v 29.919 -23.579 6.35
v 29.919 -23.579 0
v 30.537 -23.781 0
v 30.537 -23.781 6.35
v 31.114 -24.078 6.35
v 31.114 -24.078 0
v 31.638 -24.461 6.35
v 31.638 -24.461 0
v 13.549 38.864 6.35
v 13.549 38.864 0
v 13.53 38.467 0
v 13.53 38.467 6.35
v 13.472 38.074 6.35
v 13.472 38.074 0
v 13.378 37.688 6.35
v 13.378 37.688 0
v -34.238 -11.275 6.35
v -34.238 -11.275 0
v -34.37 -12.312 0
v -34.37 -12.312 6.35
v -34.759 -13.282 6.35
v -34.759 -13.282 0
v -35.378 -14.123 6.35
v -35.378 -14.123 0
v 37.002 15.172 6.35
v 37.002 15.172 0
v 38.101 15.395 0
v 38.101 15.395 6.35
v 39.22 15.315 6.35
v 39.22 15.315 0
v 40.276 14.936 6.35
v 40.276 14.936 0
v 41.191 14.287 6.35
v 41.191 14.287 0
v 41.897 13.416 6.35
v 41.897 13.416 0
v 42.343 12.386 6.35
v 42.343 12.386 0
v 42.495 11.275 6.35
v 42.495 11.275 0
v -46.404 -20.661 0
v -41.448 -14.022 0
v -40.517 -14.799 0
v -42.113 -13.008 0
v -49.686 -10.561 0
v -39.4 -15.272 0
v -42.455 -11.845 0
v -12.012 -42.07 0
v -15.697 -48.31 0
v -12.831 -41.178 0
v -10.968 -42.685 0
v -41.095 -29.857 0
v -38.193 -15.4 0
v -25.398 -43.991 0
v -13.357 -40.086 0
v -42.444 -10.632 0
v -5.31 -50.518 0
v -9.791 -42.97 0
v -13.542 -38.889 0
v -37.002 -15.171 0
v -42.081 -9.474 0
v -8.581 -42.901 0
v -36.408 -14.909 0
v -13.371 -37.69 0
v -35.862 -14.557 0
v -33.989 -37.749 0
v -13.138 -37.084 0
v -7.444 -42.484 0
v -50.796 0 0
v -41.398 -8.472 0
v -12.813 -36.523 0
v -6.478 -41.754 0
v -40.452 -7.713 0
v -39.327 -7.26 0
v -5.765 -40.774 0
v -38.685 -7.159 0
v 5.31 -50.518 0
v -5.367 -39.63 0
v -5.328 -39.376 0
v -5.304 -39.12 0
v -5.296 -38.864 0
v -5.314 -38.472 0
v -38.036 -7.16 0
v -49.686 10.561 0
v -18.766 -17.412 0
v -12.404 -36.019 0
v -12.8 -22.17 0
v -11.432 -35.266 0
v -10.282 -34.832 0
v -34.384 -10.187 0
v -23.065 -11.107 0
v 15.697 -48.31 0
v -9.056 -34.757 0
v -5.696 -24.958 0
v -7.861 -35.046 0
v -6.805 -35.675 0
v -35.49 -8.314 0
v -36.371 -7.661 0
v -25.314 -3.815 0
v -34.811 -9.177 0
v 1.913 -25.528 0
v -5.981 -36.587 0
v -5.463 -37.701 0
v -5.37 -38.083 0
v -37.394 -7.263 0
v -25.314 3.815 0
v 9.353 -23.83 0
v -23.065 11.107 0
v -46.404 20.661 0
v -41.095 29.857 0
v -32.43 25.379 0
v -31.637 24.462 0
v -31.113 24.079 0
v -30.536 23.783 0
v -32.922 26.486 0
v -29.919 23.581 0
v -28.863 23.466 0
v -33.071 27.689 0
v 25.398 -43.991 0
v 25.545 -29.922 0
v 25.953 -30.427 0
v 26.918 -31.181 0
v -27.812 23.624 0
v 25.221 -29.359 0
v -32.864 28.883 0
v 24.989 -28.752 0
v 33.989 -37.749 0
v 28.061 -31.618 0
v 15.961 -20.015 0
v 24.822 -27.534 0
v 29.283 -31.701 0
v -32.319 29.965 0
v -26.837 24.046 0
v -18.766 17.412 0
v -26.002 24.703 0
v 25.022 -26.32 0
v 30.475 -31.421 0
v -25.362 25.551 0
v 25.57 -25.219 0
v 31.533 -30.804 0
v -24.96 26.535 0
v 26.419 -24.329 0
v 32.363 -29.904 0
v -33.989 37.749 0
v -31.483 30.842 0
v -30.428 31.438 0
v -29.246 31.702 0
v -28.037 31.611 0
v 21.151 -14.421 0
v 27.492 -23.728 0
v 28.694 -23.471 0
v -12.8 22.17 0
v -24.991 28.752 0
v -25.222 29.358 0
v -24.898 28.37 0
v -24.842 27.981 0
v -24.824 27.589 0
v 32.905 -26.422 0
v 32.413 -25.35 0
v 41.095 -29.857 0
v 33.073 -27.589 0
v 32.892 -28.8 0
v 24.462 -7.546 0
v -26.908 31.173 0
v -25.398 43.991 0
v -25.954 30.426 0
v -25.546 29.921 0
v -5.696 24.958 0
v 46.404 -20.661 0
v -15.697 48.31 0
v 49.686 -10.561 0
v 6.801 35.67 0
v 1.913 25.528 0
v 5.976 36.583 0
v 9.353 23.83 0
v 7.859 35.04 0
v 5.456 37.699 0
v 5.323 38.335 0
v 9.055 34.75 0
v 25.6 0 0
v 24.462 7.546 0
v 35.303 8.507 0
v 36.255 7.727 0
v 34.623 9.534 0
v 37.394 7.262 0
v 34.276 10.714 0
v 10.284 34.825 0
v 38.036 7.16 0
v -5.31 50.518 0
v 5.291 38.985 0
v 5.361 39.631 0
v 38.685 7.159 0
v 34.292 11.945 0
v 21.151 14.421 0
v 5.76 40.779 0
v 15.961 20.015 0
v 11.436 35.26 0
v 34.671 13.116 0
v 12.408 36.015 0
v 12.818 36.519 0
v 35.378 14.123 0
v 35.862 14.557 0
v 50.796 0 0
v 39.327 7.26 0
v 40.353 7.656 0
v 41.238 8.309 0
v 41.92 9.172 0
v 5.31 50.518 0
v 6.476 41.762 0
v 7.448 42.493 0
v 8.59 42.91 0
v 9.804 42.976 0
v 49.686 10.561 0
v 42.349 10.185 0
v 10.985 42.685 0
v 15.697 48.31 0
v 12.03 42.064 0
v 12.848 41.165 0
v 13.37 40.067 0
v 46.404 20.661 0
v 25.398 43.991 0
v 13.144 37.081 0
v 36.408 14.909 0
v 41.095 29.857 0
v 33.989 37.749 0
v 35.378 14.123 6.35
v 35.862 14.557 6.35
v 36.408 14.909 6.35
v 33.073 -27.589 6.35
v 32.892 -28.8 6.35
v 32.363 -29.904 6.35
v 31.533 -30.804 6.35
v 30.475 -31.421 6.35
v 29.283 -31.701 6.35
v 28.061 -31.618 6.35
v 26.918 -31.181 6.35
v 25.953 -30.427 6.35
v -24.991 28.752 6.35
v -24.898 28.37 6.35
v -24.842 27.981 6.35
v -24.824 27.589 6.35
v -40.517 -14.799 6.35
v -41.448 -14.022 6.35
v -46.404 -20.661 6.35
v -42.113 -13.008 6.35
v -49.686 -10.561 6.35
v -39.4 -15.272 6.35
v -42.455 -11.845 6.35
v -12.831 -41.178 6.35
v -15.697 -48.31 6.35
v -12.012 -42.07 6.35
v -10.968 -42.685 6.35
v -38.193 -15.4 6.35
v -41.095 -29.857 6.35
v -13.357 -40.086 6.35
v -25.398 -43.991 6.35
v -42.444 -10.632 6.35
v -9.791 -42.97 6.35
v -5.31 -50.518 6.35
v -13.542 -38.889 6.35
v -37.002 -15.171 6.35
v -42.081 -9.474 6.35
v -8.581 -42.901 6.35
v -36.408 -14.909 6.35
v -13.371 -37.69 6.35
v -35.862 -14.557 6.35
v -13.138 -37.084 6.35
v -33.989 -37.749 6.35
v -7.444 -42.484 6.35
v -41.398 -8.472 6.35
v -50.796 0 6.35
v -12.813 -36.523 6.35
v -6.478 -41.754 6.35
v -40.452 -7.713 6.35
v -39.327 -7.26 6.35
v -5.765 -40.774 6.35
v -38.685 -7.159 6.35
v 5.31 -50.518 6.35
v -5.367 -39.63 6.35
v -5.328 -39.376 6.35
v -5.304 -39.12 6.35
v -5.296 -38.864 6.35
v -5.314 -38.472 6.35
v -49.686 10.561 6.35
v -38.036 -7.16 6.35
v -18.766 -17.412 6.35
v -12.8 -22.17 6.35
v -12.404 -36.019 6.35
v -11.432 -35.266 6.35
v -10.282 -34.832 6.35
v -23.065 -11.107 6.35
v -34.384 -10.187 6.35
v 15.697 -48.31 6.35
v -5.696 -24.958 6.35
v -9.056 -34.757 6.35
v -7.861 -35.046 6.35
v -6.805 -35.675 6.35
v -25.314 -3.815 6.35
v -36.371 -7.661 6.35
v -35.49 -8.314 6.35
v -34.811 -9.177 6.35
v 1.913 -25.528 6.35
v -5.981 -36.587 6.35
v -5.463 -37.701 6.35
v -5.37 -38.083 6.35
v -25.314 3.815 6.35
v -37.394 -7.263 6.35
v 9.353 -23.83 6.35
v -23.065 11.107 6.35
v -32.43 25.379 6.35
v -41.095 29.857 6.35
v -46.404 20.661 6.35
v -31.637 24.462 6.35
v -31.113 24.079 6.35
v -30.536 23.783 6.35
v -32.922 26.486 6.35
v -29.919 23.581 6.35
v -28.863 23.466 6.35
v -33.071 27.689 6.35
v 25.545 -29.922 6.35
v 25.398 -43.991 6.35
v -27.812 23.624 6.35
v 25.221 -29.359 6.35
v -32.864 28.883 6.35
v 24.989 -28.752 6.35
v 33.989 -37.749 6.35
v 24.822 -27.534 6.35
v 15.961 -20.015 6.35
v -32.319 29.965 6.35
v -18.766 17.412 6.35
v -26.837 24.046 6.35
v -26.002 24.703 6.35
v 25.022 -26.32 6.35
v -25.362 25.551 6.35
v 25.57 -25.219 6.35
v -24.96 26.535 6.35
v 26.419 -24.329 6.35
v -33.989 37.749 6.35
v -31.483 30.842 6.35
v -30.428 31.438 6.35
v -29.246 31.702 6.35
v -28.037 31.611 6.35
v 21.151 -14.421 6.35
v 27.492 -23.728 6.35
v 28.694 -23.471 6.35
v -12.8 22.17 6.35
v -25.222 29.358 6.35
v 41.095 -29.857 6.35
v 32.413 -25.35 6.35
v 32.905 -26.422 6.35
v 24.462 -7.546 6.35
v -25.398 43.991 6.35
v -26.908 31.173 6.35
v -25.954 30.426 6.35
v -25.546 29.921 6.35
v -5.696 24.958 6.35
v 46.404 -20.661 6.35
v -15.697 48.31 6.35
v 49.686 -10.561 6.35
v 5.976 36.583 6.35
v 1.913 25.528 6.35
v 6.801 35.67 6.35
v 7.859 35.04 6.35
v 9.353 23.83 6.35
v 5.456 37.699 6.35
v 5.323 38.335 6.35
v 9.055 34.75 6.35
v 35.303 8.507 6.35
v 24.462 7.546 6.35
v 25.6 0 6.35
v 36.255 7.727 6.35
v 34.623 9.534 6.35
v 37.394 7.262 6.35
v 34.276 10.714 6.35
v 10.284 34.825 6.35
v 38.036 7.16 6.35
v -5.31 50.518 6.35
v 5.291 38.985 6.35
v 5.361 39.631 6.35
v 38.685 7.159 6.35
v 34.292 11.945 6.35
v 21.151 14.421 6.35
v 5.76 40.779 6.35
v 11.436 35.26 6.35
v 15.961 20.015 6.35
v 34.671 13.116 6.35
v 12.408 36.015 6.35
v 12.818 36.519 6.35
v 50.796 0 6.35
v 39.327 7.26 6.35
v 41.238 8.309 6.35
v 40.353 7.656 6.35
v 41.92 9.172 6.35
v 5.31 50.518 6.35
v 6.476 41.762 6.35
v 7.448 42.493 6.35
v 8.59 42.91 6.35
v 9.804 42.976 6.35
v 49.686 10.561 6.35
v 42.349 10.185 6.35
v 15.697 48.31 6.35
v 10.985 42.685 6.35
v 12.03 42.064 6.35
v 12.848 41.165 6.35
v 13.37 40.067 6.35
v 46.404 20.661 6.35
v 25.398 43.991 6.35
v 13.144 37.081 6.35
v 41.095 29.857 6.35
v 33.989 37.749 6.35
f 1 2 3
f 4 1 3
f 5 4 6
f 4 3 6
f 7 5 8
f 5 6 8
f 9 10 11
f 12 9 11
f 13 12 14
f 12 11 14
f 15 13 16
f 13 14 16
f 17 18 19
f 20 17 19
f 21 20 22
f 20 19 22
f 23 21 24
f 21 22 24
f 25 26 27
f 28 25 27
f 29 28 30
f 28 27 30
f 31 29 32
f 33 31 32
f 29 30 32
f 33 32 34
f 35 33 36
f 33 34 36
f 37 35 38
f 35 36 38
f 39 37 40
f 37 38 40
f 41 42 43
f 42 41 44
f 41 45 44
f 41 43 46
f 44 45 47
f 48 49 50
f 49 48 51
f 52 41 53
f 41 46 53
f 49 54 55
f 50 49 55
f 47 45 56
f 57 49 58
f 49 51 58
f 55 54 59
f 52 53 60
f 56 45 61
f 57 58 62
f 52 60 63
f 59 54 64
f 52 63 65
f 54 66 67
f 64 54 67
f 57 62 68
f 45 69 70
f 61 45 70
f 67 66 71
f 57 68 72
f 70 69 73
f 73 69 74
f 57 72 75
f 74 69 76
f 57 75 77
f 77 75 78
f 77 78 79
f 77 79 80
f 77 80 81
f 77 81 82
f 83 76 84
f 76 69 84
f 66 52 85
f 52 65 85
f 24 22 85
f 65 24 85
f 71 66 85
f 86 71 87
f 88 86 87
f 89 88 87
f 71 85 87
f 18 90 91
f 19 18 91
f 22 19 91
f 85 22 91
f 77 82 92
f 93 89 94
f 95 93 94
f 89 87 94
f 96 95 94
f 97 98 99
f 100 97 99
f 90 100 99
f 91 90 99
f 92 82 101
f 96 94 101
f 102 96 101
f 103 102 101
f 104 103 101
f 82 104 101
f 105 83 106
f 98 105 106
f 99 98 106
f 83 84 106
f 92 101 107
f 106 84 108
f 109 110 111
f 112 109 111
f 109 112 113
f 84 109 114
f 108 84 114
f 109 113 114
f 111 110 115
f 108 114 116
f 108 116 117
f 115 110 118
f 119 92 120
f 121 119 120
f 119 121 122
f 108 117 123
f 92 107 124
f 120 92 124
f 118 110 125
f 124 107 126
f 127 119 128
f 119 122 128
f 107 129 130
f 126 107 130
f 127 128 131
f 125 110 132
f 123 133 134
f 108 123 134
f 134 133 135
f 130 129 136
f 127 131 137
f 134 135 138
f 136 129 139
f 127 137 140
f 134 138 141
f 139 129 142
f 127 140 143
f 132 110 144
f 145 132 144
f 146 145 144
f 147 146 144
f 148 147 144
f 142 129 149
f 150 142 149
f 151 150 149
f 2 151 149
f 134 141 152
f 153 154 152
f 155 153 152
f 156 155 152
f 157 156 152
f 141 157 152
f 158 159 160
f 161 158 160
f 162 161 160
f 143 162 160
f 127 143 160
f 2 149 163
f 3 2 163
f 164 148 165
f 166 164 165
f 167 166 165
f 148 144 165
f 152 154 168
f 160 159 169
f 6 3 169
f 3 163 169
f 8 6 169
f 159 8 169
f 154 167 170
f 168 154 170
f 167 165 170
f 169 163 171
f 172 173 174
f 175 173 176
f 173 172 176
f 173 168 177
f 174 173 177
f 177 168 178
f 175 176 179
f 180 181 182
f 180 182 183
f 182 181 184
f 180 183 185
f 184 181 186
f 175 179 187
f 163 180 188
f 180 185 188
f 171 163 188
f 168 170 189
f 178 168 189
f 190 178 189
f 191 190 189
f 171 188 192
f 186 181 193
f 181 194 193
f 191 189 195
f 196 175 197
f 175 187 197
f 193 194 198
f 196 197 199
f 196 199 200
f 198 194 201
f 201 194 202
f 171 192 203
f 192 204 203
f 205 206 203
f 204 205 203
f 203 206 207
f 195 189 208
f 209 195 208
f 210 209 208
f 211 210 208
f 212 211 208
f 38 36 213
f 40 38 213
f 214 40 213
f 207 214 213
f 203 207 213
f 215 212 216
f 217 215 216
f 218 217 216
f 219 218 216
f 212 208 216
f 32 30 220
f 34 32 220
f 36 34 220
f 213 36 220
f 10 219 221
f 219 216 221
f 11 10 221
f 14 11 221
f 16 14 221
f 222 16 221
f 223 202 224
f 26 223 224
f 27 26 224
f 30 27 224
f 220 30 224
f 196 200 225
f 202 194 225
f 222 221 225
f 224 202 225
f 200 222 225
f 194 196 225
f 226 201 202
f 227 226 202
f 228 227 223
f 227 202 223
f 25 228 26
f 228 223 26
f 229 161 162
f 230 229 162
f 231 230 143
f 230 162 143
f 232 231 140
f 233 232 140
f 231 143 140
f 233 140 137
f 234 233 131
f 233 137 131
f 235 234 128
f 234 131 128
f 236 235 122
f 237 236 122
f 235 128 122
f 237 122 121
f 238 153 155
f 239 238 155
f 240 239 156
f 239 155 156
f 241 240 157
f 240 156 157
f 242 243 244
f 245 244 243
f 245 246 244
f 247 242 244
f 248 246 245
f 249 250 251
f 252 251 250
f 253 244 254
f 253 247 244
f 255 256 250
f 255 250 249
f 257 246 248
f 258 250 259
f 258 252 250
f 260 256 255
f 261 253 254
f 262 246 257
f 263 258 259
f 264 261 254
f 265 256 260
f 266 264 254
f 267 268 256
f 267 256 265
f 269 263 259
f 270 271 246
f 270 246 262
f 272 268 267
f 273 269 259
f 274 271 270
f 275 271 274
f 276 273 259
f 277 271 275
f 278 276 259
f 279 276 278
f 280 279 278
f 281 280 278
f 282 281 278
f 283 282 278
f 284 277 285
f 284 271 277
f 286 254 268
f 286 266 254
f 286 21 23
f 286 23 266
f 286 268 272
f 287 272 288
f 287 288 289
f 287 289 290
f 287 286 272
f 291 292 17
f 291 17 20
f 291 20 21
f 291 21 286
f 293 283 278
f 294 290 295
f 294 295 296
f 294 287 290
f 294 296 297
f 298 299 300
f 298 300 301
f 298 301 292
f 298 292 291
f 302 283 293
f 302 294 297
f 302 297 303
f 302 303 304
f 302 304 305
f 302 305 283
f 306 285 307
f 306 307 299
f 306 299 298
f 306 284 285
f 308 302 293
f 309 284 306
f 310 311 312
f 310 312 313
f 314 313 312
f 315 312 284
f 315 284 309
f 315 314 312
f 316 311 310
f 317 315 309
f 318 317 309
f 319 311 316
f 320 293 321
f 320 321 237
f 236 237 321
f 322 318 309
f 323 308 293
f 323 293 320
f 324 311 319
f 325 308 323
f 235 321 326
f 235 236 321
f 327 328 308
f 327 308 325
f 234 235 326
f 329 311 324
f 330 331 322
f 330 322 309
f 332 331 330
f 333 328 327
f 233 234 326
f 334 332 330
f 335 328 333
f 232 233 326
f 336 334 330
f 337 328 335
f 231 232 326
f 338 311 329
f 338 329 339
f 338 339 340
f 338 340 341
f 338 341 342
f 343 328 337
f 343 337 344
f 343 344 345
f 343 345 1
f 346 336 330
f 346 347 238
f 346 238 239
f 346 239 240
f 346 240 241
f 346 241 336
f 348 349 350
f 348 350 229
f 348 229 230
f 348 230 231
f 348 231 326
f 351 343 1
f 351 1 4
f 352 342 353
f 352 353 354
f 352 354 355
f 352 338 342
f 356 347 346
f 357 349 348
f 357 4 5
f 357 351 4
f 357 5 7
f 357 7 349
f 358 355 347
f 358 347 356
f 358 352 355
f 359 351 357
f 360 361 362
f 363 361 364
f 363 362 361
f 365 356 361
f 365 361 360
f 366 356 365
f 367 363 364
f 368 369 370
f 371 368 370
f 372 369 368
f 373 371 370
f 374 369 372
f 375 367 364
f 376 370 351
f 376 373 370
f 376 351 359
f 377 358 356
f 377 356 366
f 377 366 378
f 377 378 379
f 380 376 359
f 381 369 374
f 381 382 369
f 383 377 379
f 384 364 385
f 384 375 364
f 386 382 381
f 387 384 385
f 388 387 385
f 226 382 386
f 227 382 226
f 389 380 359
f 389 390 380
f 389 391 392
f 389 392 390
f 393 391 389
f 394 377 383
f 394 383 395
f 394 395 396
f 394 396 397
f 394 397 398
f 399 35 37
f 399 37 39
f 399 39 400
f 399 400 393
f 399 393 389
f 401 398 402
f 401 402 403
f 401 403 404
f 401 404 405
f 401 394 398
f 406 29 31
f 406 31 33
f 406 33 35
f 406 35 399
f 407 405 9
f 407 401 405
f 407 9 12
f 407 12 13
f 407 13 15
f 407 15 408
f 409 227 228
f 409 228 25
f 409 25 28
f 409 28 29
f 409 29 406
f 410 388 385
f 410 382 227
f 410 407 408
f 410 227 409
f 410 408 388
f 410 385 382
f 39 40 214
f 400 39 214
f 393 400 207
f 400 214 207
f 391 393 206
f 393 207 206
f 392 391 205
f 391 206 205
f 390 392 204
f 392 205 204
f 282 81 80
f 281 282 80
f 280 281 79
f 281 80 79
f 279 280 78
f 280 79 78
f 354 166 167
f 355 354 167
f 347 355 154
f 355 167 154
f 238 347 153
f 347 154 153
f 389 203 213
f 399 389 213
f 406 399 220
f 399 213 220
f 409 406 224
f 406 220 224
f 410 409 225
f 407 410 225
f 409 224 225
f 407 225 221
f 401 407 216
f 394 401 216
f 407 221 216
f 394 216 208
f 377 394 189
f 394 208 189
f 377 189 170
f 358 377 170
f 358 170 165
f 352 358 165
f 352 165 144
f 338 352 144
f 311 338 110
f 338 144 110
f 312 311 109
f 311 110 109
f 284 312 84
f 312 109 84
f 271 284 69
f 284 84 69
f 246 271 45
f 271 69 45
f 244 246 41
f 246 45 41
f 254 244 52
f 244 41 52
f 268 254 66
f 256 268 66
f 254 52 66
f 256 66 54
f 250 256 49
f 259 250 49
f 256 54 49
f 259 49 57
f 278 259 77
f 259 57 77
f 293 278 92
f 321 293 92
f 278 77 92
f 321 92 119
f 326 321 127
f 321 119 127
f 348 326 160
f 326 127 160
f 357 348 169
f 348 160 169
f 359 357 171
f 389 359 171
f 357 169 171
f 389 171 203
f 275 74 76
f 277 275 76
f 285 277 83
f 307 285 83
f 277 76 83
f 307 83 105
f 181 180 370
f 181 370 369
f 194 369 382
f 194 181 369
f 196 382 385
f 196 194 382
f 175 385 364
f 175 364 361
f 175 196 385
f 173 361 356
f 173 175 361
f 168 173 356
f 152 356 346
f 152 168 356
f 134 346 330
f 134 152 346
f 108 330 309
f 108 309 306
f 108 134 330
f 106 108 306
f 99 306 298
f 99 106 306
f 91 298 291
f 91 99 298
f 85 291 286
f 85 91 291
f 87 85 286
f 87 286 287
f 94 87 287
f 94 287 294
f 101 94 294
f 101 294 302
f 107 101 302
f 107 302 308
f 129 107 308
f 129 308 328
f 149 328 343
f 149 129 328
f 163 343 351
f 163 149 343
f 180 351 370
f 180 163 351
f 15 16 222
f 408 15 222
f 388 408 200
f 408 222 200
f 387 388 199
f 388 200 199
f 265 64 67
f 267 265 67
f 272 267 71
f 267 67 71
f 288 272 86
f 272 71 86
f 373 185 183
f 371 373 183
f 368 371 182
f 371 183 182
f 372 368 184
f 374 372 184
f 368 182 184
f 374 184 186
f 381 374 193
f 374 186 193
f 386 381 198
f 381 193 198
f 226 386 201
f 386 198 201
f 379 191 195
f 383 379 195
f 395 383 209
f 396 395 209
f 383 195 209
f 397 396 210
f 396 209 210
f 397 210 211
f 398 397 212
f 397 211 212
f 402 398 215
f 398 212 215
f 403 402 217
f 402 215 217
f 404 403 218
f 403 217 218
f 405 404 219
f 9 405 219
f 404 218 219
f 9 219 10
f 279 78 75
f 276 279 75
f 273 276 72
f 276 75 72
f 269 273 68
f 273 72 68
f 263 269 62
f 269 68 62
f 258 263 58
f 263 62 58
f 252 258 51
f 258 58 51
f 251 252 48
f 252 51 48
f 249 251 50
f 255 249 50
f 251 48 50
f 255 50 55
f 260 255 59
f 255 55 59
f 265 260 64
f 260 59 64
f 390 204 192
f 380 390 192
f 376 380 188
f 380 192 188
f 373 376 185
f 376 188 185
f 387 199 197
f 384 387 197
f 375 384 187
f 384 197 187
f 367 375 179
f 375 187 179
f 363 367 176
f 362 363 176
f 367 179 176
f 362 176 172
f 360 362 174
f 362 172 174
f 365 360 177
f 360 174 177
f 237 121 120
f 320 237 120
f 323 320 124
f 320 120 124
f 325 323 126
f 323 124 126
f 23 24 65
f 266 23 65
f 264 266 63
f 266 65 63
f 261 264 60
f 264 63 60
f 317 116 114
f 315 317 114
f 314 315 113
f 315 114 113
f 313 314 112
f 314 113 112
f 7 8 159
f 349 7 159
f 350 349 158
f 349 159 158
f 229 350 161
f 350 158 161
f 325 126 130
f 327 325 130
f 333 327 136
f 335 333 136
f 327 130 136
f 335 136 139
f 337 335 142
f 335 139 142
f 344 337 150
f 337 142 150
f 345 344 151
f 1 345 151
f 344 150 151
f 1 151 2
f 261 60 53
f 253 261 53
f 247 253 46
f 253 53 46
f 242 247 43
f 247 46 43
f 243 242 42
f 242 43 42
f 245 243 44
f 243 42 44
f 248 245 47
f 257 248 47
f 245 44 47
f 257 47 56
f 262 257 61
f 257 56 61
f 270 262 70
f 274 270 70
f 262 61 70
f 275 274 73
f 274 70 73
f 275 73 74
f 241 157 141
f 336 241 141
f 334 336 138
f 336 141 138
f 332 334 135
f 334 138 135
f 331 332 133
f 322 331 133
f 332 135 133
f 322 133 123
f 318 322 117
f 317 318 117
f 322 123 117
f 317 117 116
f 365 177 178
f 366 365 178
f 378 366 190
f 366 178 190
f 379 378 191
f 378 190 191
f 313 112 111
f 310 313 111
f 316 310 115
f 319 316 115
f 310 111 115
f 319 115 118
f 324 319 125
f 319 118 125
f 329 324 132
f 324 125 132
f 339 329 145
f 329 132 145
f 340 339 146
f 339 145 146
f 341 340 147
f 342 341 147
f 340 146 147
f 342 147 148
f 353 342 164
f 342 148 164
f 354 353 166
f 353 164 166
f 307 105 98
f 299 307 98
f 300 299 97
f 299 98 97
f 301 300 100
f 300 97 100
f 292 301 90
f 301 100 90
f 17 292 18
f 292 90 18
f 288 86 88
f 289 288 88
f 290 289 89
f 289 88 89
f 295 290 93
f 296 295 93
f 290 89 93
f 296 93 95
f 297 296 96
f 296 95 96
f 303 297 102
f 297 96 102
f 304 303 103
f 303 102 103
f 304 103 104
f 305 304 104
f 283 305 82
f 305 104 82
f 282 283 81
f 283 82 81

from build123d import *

# Parameters (mm, degrees)
F0_R     = 50.796035682
F1_DEPTH = 6.35
F0_R_2   = 25.5997355282
F2_DEPTH = 6.35


with BuildPart() as f1:
    # F0 (on Top) → F1 (new body)
    with BuildSketch(Plane.XY):
        Circle(F0_R)
        with BuildLine():
            ThreePointArc((39.3271974597, 7.2596428653), (39.8251792413, 3.6449928619), (39.9916350574, 0))
            ThreePointArc((39.9916350574, 0), (37.8457361774, -12.9240522963), (31.638331797, -24.4611290759))
            ThreePointArc((31.638331797, -24.4611290759), (32.6975616463, -25.8682109338), (33.0734716269, -27.5888325992))
            ThreePointArc((33.0734716269, -27.5888325992), (30.4751171589, -31.421463006), (25.9528595707, -30.4266323255))
            ThreePointArc((25.9528595707, -30.4266323255), (11.2745427029, -38.3694613124), (-5.3673629967, -39.6298156572))
            ThreePointArc((-5.3673629967, -39.6298156572), (-10.3899431598, -42.8710411012), (-13.3713628706, -37.6900189645))
            ThreePointArc((-13.3713628706, -37.6900189645), (-27.5888779577, -28.9514194402), (-37.0021800615, -15.1713396))
            ThreePointArc((-37.0021800615, -15.1713396), (-42.3272537393, -12.438997445), (-39.3271186708, -7.2600696702))
            ThreePointArc((-39.3271186708, -7.2600696702), (-38.8660161768, 9.4214468691), (-31.637317072, 24.4624414777))
            ThreePointArc((-31.637317072, 24.4624414777), (-31.9331144569, 30.4341189249), (-25.9541217074, 30.4255557215))
            ThreePointArc((-25.9541217074, 30.4255557215), (-11.2785991848, 38.3682691165), (5.3606272578, 39.6307273459))
            ThreePointArc((5.3606272578, 39.6307273459), (9.8039037737, 42.9758363595), (13.548769251, 38.8638486327))
            ThreePointArc((13.548769251, 38.8638486327), (13.5057955215, 38.2696140057), (13.3777686423, 37.6877457633))
            ThreePointArc((13.3777686423, 37.6877457633), (27.5911811268, 28.9492244903), (37.0020154097, 15.1717411718))
            ThreePointArc((37.0020154097, 15.1717411718), (40.7552771421, 14.6424823027), (42.495179297, 11.2750160335))
            ThreePointArc((42.495179297, 11.2750160335), (41.6078280146, 8.7177063827), (39.3271974597, 7.2596428653))
        make_face(mode=Mode.SUBTRACT)
    extrude(amount=F1_DEPTH)



with BuildPart() as f1b:
    # F0 (on Top) → F1, piece 2 (new body)
    with BuildSketch(Plane.XY):
        with BuildLine():
            Line((29.9194537324, -23.5791233665), (37.3940186124, 7.2624677043))
            ThreePointArc((37.3940186124, 7.2624677043), (34.4052772179, 10.1109124169), (35.3777320032, 14.1234607462))
            Line((35.3777320032, 14.1234607462), (12.4084521668, 36.0145229256))
            ThreePointArc((12.4084521668, 36.0145229256), (8.4460308303, 34.8500592639), (5.4563650491, 37.6993849709))
            Line((5.4563650491, 37.6993849709), (-24.9908830503, 28.7516454448))
            ThreePointArc((-24.9908830503, 28.7516454448), (-24.8656043881, 28.1762274896), (-24.8235590671, 27.5888325992))
            ThreePointArc((-24.8235590671, 27.5888325992), (-26.3979468028, 24.3473427918), (-29.9190635285, 23.5807334278))
            Line((-29.9190635285, 23.5807334278), (-37.3941206986, -7.2628889331))
            ThreePointArc((-37.3941206986, -7.2628889331), (-35.1217260633, -8.7227134695), (-34.2382009209, -11.2750160335))
            ThreePointArc((-34.2382009209, -11.2750160335), (-34.5337408719, -12.8088983718), (-35.3780457549, -14.1231617225))
            Line((-35.3780457549, -14.1231617225), (-12.4035384742, -36.019205961))
            ThreePointArc((-12.4035384742, -36.019205961), (-8.4476296116, -34.8566561642), (-5.4628775231, -37.7012988359))
            Line((-5.4628775231, -37.7012988359), (24.9892935944, -28.752112549))
            ThreePointArc((24.9892935944, -28.752112549), (25.9610603149, -24.7424033164), (29.9194537324, -23.5791233665))
        make_face()
        Circle(F0_R_2, mode=Mode.SUBTRACT)
    extrude(amount=F1_DEPTH)


with BuildPart() as f1_1:
    add(f1.part)

    add(f1b.part)  # F2 merges F1b
    # F0 (on Top) → F2 (join)
    with BuildSketch(Plane.XY):
        with BuildLine():
            ThreePointArc((31.638331797, -24.4611290759), (37.8457361774, -12.9240522963), (39.9916350574, 0))
            ThreePointArc((39.9916350574, 0), (39.8251792413, 3.6449928619), (39.3271974597, 7.2596428653))
            ThreePointArc((39.3271974597, 7.2596428653), (38.3604403722, 7.146314542), (37.3940186124, 7.2624677043))
            Line((37.3940186124, 7.2624677043), (29.9194537324, -23.5791233665))
            ThreePointArc((29.9194537324, -23.5791233665), (30.8312469464, -23.9180968879), (31.638331797, -24.4611290759))
        make_face()
        with BuildLine():
            ThreePointArc((35.3777320032, 14.1234607462), (36.1276546961, 14.7440077063), (37.0020154097, 15.1717411718))
            ThreePointArc((37.0020154097, 15.1717411718), (27.5911811268, 28.9492244903), (13.3777686423, 37.6877457633))
            ThreePointArc((13.3777686423, 37.6877457633), (12.9924184393, 36.7936041028), (12.4084521668, 36.0145229256))
            Line((12.4084521668, 36.0145229256), (35.3777320032, 14.1234607462))
        make_face()
        with BuildLine():
            ThreePointArc((-5.3673629967, -39.6298156572), (11.2745427029, -38.3694613124), (25.9528595707, -30.4266323255))
            ThreePointArc((25.9528595707, -30.4266323255), (25.3716802728, -29.6465678813), (24.9892935944, -28.752112549))
            Line((24.9892935944, -28.752112549), (-5.4628775231, -37.7012988359))
            ThreePointArc((-5.4628775231, -37.7012988359), (-5.3376272012, -38.2765866213), (-5.2955913916, -38.8638486327))
            ThreePointArc((-5.2955913916, -38.8638486327), (-5.3135735047, -39.2485097322), (-5.3673629967, -39.6298156572))
        make_face()
        with BuildLine():
            ThreePointArc((5.4563650491, 37.6993849709), (5.2938683757, 38.6593739913), (5.3606272578, 39.6307273459))
            ThreePointArc((5.3606272578, 39.6307273459), (-11.2785991848, 38.3682691165), (-25.9541217074, 30.4255557215))
            ThreePointArc((-25.9541217074, 30.4255557215), (-25.3731377903, 29.6457791632), (-24.9908830503, 28.7516454448))
            Line((-24.9908830503, 28.7516454448), (5.4563650491, 37.6993849709))
        make_face()
        with BuildLine():
            ThreePointArc((-37.0021800615, -15.1713396), (-27.5888779577, -28.9514194402), (-13.3713628706, -37.6900189645))
            ThreePointArc((-13.3713628706, -37.6900189645), (-12.9866339101, -36.7971602183), (-12.4035384742, -36.019205961))
            Line((-12.4035384742, -36.019205961), (-35.3780457549, -14.1231617225))
            ThreePointArc((-35.3780457549, -14.1231617225), (-36.1278992542, -14.7436496905), (-37.0021800615, -15.1713396))
        make_face()
        with BuildLine():
            ThreePointArc((-29.9190635285, 23.5807334278), (-30.8305291615, 23.9195906141), (-31.637317072, 24.4624414777))
            ThreePointArc((-31.637317072, 24.4624414777), (-38.8660161768, 9.4214468691), (-39.3271186708, -7.2600696702))
            ThreePointArc((-39.3271186708, -7.2600696702), (-38.3604523499, -7.1467479477), (-37.3941206986, -7.2628889331))
            Line((-37.3941206986, -7.2628889331), (-29.9190635285, 23.5807334278))
        make_face()
    extrude(amount=F2_DEPTH)


solid = f1_1.part
